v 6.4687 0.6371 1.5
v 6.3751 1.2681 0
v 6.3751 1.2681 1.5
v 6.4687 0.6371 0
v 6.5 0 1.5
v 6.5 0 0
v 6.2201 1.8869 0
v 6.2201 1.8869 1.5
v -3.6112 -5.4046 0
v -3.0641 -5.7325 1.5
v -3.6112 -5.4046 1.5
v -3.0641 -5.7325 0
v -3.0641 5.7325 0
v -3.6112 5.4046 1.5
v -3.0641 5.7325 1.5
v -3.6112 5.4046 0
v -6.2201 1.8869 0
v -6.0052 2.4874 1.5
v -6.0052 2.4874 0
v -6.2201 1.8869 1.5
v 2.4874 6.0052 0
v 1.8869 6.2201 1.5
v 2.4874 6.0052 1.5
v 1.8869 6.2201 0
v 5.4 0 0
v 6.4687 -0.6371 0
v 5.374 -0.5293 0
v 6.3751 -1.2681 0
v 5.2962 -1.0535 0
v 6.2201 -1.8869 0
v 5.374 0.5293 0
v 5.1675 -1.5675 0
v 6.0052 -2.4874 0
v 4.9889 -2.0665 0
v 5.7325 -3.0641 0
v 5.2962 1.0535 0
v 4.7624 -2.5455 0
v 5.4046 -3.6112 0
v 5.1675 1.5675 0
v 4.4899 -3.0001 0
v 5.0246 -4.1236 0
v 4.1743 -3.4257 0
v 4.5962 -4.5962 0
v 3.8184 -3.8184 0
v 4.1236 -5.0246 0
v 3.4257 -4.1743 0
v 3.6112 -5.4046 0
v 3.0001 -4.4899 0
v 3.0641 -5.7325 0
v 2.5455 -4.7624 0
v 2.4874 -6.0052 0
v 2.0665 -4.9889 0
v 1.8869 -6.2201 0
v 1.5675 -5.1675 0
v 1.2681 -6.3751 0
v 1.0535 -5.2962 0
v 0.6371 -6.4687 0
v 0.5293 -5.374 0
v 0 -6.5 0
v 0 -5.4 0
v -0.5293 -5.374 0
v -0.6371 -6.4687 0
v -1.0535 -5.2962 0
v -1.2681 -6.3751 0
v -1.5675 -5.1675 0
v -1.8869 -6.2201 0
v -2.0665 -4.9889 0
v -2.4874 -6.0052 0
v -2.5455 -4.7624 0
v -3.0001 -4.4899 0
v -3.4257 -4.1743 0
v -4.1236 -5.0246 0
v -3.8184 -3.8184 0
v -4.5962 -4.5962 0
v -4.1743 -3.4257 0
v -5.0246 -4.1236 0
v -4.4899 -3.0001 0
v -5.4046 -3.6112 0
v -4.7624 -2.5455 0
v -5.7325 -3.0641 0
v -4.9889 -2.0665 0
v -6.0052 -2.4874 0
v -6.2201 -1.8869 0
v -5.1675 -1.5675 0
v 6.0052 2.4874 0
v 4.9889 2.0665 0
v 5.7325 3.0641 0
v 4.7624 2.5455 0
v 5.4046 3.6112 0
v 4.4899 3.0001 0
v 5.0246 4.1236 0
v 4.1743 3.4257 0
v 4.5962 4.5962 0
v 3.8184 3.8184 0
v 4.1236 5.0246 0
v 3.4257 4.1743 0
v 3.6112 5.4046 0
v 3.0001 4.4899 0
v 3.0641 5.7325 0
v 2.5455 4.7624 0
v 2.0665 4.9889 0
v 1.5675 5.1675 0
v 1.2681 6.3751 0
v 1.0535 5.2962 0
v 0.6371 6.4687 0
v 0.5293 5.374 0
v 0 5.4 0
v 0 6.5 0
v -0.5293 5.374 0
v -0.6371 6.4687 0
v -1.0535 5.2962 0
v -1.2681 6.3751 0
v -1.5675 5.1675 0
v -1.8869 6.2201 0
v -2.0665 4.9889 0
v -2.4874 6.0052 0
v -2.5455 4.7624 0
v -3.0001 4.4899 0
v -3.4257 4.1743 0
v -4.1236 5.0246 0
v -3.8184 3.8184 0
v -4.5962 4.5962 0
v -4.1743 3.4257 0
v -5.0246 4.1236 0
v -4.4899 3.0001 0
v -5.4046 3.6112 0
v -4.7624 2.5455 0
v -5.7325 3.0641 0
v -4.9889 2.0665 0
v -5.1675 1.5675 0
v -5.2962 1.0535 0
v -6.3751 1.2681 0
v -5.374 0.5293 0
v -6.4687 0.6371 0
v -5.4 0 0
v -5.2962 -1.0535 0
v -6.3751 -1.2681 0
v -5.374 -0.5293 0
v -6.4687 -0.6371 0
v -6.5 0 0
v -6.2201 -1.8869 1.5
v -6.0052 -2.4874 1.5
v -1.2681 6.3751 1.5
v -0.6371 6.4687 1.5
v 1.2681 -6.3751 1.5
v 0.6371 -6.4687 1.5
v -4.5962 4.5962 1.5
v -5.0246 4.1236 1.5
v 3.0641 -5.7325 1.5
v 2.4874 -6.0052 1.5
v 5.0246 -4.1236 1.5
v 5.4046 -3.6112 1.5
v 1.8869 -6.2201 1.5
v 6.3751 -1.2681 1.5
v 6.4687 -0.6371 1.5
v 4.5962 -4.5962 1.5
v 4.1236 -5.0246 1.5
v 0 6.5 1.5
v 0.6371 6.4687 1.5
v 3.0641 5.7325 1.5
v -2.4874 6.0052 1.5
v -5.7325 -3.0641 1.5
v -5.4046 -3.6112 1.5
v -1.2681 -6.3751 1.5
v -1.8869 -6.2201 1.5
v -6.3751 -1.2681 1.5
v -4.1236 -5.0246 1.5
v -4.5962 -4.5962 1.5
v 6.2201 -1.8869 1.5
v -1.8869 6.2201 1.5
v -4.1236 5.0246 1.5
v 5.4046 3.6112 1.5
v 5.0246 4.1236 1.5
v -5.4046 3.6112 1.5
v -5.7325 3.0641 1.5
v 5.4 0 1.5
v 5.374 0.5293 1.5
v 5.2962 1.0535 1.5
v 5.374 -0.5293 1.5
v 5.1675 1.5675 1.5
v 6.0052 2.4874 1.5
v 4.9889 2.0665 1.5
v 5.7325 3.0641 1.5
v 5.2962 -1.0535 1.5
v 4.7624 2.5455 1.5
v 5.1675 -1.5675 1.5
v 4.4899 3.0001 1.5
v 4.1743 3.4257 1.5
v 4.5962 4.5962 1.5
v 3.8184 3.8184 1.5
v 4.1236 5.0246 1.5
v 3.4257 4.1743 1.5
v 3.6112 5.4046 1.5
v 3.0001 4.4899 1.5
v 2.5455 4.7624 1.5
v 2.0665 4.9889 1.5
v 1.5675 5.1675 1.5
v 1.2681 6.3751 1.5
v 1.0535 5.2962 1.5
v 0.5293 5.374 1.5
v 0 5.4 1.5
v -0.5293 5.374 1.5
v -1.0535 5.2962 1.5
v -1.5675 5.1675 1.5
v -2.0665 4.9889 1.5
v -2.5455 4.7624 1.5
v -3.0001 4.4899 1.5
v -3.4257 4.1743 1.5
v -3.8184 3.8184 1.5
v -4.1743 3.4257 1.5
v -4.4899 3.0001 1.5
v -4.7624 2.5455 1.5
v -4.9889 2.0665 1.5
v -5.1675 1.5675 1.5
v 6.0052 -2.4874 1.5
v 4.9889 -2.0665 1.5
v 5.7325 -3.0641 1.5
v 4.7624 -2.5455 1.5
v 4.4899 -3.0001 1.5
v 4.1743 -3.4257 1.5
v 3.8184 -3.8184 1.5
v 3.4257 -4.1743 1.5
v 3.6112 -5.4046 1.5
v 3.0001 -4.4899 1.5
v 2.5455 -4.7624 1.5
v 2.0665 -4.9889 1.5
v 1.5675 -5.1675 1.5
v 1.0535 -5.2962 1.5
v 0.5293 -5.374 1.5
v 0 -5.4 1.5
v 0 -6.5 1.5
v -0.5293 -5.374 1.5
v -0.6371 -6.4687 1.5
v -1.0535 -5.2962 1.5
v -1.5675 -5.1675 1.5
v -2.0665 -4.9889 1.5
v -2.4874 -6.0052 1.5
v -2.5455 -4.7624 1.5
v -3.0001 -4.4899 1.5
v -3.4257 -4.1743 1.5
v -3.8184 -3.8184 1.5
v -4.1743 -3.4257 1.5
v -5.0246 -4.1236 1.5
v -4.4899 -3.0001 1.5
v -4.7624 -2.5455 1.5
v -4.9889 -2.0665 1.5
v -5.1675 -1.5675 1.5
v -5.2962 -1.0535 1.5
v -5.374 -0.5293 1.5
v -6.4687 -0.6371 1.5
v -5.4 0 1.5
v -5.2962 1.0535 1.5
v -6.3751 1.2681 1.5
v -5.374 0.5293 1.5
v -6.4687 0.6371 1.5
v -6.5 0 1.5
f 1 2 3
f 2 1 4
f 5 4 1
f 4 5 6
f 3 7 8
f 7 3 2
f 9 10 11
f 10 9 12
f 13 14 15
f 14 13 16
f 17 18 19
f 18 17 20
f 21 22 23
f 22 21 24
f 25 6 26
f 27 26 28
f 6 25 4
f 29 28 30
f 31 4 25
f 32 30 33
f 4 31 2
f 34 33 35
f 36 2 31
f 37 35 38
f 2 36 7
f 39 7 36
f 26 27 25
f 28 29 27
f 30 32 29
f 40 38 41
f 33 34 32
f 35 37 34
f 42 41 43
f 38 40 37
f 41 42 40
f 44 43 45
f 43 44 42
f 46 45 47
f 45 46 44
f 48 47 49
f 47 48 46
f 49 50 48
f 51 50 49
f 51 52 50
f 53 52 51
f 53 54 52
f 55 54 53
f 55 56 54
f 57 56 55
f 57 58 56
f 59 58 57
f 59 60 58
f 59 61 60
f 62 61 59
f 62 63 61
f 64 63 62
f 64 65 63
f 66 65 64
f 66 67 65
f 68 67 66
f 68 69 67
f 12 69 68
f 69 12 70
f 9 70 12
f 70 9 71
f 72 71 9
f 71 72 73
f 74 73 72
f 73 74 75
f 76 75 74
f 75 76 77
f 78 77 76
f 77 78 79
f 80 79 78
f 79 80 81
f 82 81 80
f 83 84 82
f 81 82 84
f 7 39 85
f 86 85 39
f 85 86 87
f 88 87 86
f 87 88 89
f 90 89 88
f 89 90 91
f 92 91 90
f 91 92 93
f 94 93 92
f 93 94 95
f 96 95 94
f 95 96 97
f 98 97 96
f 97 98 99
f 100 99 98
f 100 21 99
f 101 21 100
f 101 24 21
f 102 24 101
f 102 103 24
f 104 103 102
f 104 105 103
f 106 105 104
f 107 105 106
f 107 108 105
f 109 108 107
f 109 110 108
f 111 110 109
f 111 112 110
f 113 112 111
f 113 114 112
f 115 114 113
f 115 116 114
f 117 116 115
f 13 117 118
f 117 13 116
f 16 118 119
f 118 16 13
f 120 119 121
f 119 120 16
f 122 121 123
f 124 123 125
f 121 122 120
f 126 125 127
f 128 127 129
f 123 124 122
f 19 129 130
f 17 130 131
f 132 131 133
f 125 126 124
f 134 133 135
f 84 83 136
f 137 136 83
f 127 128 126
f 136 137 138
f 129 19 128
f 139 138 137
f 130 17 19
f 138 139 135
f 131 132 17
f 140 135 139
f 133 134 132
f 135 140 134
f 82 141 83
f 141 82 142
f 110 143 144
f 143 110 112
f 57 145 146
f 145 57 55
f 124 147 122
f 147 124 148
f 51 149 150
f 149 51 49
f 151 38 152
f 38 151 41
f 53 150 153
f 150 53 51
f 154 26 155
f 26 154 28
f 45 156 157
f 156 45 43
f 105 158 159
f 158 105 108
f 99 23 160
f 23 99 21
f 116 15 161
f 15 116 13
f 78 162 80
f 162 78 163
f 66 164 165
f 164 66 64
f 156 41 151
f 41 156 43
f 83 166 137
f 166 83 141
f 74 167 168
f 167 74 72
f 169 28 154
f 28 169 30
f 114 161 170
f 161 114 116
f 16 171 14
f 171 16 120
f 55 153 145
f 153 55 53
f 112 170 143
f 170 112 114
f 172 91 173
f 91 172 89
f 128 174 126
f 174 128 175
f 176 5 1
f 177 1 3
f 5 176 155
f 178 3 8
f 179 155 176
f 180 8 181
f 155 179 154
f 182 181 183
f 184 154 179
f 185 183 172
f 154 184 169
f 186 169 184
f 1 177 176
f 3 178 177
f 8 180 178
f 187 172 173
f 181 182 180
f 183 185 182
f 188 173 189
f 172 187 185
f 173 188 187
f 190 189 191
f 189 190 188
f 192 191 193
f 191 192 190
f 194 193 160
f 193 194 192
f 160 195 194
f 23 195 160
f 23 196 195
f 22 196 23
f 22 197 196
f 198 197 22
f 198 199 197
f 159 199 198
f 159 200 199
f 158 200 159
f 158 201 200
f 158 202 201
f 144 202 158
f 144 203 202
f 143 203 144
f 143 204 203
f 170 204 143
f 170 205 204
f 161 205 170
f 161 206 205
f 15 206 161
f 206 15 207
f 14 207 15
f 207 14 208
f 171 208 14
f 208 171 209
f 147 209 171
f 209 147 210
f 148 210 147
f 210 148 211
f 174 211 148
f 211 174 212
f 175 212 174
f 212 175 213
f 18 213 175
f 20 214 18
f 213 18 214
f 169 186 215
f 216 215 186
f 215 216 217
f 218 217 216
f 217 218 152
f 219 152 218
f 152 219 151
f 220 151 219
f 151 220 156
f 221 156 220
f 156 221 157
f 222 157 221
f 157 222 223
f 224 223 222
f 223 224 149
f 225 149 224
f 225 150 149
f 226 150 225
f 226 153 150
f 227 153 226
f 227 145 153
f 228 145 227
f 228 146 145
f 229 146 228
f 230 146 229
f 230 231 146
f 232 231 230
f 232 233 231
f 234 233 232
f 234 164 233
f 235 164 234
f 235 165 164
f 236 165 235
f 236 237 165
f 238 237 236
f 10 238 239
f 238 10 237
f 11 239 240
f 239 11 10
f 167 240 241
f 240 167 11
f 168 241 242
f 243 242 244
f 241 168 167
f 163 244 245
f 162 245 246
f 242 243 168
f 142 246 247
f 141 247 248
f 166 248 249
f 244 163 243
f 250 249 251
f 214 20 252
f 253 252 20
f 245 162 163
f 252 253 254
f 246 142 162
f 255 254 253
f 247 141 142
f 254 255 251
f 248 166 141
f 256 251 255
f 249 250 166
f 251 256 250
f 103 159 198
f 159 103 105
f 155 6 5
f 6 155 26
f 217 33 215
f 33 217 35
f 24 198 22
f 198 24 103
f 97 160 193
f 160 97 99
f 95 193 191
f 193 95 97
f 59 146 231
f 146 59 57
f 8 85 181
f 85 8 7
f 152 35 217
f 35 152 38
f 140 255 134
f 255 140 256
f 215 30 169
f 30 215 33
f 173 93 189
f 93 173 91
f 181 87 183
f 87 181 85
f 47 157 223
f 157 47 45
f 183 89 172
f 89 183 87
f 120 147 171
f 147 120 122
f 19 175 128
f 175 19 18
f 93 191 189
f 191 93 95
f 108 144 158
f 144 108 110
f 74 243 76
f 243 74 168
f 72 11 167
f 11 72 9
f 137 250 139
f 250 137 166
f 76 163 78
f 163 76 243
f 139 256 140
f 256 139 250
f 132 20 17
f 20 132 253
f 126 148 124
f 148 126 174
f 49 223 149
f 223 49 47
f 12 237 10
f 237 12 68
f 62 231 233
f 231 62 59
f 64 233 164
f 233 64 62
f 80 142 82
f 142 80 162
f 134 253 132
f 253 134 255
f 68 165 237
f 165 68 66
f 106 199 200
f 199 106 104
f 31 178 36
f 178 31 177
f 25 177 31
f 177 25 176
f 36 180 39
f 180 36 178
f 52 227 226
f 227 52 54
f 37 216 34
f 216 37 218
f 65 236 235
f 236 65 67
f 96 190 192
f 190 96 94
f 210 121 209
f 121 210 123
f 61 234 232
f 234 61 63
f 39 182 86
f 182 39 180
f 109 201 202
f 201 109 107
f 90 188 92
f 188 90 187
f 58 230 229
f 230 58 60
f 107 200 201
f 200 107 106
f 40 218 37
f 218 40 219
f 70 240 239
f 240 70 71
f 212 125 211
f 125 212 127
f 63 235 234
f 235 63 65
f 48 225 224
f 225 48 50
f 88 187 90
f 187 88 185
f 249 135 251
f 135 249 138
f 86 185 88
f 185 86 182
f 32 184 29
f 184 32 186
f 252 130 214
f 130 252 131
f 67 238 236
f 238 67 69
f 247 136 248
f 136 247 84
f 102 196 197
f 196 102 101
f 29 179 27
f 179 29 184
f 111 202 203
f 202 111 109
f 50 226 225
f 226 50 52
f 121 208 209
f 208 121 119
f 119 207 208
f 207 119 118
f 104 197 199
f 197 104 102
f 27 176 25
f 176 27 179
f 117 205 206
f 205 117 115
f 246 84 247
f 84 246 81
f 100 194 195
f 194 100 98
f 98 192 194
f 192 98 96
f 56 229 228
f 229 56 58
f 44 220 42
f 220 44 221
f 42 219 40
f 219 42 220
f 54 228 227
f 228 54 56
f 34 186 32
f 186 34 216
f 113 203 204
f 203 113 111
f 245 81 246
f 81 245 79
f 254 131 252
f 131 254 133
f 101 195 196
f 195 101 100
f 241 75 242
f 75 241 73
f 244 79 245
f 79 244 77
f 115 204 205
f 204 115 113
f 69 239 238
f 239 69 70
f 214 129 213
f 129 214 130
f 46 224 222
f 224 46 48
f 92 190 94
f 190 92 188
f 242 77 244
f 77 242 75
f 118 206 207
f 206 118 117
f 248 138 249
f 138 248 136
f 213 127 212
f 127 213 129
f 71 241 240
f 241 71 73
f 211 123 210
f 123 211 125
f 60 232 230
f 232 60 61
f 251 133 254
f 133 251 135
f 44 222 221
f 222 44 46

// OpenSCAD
// PCR Tube Adapter Sleeve - fits 0.2mL tubes into 1.5mL rack holes.
// Print orientation: Collar on bed (Z=0), body rises upward.

// Dimensions
collar_od = 13;      // Collar outer diameter
collar_thick = 1.5;  // Collar thickness (Z=0 to 1.5)
body_od = 10.8;      // Sleeve body outer diameter
body_top_z = 21.5;   // Top of sleeve body
bore_d = 6.2;        // Through-hole diameter

$fn = 64;

difference() {
    // 1. The Collar: A cylinder from Z=0 to Z=1.5 with OD=13mm.
    // This creates the wide base that sits on the bed.
    translate([0, 0, 0]) 
        cylinder(h = collar_thick, d = collar_od);
    
    // 2. The Body: A cylinder from Z=0 to Z=21.5 with OD=10.8mm.
    // This sits on top of the collar (and extends through it) to form the sleeve.
    translate([0, 0, 0]) 
        cylinder(h = body_top_z, d = body_od);
    
    // 3. The Bore: A hole running through the full height.
    // Starts slightly below Z=0 and ends slightly above Z=body_top_z to ensure clean cuts.
    translate([0, 0, -0.1]) 
        cylinder(h = body_top_z + 0.9, d = bore_d);
}
